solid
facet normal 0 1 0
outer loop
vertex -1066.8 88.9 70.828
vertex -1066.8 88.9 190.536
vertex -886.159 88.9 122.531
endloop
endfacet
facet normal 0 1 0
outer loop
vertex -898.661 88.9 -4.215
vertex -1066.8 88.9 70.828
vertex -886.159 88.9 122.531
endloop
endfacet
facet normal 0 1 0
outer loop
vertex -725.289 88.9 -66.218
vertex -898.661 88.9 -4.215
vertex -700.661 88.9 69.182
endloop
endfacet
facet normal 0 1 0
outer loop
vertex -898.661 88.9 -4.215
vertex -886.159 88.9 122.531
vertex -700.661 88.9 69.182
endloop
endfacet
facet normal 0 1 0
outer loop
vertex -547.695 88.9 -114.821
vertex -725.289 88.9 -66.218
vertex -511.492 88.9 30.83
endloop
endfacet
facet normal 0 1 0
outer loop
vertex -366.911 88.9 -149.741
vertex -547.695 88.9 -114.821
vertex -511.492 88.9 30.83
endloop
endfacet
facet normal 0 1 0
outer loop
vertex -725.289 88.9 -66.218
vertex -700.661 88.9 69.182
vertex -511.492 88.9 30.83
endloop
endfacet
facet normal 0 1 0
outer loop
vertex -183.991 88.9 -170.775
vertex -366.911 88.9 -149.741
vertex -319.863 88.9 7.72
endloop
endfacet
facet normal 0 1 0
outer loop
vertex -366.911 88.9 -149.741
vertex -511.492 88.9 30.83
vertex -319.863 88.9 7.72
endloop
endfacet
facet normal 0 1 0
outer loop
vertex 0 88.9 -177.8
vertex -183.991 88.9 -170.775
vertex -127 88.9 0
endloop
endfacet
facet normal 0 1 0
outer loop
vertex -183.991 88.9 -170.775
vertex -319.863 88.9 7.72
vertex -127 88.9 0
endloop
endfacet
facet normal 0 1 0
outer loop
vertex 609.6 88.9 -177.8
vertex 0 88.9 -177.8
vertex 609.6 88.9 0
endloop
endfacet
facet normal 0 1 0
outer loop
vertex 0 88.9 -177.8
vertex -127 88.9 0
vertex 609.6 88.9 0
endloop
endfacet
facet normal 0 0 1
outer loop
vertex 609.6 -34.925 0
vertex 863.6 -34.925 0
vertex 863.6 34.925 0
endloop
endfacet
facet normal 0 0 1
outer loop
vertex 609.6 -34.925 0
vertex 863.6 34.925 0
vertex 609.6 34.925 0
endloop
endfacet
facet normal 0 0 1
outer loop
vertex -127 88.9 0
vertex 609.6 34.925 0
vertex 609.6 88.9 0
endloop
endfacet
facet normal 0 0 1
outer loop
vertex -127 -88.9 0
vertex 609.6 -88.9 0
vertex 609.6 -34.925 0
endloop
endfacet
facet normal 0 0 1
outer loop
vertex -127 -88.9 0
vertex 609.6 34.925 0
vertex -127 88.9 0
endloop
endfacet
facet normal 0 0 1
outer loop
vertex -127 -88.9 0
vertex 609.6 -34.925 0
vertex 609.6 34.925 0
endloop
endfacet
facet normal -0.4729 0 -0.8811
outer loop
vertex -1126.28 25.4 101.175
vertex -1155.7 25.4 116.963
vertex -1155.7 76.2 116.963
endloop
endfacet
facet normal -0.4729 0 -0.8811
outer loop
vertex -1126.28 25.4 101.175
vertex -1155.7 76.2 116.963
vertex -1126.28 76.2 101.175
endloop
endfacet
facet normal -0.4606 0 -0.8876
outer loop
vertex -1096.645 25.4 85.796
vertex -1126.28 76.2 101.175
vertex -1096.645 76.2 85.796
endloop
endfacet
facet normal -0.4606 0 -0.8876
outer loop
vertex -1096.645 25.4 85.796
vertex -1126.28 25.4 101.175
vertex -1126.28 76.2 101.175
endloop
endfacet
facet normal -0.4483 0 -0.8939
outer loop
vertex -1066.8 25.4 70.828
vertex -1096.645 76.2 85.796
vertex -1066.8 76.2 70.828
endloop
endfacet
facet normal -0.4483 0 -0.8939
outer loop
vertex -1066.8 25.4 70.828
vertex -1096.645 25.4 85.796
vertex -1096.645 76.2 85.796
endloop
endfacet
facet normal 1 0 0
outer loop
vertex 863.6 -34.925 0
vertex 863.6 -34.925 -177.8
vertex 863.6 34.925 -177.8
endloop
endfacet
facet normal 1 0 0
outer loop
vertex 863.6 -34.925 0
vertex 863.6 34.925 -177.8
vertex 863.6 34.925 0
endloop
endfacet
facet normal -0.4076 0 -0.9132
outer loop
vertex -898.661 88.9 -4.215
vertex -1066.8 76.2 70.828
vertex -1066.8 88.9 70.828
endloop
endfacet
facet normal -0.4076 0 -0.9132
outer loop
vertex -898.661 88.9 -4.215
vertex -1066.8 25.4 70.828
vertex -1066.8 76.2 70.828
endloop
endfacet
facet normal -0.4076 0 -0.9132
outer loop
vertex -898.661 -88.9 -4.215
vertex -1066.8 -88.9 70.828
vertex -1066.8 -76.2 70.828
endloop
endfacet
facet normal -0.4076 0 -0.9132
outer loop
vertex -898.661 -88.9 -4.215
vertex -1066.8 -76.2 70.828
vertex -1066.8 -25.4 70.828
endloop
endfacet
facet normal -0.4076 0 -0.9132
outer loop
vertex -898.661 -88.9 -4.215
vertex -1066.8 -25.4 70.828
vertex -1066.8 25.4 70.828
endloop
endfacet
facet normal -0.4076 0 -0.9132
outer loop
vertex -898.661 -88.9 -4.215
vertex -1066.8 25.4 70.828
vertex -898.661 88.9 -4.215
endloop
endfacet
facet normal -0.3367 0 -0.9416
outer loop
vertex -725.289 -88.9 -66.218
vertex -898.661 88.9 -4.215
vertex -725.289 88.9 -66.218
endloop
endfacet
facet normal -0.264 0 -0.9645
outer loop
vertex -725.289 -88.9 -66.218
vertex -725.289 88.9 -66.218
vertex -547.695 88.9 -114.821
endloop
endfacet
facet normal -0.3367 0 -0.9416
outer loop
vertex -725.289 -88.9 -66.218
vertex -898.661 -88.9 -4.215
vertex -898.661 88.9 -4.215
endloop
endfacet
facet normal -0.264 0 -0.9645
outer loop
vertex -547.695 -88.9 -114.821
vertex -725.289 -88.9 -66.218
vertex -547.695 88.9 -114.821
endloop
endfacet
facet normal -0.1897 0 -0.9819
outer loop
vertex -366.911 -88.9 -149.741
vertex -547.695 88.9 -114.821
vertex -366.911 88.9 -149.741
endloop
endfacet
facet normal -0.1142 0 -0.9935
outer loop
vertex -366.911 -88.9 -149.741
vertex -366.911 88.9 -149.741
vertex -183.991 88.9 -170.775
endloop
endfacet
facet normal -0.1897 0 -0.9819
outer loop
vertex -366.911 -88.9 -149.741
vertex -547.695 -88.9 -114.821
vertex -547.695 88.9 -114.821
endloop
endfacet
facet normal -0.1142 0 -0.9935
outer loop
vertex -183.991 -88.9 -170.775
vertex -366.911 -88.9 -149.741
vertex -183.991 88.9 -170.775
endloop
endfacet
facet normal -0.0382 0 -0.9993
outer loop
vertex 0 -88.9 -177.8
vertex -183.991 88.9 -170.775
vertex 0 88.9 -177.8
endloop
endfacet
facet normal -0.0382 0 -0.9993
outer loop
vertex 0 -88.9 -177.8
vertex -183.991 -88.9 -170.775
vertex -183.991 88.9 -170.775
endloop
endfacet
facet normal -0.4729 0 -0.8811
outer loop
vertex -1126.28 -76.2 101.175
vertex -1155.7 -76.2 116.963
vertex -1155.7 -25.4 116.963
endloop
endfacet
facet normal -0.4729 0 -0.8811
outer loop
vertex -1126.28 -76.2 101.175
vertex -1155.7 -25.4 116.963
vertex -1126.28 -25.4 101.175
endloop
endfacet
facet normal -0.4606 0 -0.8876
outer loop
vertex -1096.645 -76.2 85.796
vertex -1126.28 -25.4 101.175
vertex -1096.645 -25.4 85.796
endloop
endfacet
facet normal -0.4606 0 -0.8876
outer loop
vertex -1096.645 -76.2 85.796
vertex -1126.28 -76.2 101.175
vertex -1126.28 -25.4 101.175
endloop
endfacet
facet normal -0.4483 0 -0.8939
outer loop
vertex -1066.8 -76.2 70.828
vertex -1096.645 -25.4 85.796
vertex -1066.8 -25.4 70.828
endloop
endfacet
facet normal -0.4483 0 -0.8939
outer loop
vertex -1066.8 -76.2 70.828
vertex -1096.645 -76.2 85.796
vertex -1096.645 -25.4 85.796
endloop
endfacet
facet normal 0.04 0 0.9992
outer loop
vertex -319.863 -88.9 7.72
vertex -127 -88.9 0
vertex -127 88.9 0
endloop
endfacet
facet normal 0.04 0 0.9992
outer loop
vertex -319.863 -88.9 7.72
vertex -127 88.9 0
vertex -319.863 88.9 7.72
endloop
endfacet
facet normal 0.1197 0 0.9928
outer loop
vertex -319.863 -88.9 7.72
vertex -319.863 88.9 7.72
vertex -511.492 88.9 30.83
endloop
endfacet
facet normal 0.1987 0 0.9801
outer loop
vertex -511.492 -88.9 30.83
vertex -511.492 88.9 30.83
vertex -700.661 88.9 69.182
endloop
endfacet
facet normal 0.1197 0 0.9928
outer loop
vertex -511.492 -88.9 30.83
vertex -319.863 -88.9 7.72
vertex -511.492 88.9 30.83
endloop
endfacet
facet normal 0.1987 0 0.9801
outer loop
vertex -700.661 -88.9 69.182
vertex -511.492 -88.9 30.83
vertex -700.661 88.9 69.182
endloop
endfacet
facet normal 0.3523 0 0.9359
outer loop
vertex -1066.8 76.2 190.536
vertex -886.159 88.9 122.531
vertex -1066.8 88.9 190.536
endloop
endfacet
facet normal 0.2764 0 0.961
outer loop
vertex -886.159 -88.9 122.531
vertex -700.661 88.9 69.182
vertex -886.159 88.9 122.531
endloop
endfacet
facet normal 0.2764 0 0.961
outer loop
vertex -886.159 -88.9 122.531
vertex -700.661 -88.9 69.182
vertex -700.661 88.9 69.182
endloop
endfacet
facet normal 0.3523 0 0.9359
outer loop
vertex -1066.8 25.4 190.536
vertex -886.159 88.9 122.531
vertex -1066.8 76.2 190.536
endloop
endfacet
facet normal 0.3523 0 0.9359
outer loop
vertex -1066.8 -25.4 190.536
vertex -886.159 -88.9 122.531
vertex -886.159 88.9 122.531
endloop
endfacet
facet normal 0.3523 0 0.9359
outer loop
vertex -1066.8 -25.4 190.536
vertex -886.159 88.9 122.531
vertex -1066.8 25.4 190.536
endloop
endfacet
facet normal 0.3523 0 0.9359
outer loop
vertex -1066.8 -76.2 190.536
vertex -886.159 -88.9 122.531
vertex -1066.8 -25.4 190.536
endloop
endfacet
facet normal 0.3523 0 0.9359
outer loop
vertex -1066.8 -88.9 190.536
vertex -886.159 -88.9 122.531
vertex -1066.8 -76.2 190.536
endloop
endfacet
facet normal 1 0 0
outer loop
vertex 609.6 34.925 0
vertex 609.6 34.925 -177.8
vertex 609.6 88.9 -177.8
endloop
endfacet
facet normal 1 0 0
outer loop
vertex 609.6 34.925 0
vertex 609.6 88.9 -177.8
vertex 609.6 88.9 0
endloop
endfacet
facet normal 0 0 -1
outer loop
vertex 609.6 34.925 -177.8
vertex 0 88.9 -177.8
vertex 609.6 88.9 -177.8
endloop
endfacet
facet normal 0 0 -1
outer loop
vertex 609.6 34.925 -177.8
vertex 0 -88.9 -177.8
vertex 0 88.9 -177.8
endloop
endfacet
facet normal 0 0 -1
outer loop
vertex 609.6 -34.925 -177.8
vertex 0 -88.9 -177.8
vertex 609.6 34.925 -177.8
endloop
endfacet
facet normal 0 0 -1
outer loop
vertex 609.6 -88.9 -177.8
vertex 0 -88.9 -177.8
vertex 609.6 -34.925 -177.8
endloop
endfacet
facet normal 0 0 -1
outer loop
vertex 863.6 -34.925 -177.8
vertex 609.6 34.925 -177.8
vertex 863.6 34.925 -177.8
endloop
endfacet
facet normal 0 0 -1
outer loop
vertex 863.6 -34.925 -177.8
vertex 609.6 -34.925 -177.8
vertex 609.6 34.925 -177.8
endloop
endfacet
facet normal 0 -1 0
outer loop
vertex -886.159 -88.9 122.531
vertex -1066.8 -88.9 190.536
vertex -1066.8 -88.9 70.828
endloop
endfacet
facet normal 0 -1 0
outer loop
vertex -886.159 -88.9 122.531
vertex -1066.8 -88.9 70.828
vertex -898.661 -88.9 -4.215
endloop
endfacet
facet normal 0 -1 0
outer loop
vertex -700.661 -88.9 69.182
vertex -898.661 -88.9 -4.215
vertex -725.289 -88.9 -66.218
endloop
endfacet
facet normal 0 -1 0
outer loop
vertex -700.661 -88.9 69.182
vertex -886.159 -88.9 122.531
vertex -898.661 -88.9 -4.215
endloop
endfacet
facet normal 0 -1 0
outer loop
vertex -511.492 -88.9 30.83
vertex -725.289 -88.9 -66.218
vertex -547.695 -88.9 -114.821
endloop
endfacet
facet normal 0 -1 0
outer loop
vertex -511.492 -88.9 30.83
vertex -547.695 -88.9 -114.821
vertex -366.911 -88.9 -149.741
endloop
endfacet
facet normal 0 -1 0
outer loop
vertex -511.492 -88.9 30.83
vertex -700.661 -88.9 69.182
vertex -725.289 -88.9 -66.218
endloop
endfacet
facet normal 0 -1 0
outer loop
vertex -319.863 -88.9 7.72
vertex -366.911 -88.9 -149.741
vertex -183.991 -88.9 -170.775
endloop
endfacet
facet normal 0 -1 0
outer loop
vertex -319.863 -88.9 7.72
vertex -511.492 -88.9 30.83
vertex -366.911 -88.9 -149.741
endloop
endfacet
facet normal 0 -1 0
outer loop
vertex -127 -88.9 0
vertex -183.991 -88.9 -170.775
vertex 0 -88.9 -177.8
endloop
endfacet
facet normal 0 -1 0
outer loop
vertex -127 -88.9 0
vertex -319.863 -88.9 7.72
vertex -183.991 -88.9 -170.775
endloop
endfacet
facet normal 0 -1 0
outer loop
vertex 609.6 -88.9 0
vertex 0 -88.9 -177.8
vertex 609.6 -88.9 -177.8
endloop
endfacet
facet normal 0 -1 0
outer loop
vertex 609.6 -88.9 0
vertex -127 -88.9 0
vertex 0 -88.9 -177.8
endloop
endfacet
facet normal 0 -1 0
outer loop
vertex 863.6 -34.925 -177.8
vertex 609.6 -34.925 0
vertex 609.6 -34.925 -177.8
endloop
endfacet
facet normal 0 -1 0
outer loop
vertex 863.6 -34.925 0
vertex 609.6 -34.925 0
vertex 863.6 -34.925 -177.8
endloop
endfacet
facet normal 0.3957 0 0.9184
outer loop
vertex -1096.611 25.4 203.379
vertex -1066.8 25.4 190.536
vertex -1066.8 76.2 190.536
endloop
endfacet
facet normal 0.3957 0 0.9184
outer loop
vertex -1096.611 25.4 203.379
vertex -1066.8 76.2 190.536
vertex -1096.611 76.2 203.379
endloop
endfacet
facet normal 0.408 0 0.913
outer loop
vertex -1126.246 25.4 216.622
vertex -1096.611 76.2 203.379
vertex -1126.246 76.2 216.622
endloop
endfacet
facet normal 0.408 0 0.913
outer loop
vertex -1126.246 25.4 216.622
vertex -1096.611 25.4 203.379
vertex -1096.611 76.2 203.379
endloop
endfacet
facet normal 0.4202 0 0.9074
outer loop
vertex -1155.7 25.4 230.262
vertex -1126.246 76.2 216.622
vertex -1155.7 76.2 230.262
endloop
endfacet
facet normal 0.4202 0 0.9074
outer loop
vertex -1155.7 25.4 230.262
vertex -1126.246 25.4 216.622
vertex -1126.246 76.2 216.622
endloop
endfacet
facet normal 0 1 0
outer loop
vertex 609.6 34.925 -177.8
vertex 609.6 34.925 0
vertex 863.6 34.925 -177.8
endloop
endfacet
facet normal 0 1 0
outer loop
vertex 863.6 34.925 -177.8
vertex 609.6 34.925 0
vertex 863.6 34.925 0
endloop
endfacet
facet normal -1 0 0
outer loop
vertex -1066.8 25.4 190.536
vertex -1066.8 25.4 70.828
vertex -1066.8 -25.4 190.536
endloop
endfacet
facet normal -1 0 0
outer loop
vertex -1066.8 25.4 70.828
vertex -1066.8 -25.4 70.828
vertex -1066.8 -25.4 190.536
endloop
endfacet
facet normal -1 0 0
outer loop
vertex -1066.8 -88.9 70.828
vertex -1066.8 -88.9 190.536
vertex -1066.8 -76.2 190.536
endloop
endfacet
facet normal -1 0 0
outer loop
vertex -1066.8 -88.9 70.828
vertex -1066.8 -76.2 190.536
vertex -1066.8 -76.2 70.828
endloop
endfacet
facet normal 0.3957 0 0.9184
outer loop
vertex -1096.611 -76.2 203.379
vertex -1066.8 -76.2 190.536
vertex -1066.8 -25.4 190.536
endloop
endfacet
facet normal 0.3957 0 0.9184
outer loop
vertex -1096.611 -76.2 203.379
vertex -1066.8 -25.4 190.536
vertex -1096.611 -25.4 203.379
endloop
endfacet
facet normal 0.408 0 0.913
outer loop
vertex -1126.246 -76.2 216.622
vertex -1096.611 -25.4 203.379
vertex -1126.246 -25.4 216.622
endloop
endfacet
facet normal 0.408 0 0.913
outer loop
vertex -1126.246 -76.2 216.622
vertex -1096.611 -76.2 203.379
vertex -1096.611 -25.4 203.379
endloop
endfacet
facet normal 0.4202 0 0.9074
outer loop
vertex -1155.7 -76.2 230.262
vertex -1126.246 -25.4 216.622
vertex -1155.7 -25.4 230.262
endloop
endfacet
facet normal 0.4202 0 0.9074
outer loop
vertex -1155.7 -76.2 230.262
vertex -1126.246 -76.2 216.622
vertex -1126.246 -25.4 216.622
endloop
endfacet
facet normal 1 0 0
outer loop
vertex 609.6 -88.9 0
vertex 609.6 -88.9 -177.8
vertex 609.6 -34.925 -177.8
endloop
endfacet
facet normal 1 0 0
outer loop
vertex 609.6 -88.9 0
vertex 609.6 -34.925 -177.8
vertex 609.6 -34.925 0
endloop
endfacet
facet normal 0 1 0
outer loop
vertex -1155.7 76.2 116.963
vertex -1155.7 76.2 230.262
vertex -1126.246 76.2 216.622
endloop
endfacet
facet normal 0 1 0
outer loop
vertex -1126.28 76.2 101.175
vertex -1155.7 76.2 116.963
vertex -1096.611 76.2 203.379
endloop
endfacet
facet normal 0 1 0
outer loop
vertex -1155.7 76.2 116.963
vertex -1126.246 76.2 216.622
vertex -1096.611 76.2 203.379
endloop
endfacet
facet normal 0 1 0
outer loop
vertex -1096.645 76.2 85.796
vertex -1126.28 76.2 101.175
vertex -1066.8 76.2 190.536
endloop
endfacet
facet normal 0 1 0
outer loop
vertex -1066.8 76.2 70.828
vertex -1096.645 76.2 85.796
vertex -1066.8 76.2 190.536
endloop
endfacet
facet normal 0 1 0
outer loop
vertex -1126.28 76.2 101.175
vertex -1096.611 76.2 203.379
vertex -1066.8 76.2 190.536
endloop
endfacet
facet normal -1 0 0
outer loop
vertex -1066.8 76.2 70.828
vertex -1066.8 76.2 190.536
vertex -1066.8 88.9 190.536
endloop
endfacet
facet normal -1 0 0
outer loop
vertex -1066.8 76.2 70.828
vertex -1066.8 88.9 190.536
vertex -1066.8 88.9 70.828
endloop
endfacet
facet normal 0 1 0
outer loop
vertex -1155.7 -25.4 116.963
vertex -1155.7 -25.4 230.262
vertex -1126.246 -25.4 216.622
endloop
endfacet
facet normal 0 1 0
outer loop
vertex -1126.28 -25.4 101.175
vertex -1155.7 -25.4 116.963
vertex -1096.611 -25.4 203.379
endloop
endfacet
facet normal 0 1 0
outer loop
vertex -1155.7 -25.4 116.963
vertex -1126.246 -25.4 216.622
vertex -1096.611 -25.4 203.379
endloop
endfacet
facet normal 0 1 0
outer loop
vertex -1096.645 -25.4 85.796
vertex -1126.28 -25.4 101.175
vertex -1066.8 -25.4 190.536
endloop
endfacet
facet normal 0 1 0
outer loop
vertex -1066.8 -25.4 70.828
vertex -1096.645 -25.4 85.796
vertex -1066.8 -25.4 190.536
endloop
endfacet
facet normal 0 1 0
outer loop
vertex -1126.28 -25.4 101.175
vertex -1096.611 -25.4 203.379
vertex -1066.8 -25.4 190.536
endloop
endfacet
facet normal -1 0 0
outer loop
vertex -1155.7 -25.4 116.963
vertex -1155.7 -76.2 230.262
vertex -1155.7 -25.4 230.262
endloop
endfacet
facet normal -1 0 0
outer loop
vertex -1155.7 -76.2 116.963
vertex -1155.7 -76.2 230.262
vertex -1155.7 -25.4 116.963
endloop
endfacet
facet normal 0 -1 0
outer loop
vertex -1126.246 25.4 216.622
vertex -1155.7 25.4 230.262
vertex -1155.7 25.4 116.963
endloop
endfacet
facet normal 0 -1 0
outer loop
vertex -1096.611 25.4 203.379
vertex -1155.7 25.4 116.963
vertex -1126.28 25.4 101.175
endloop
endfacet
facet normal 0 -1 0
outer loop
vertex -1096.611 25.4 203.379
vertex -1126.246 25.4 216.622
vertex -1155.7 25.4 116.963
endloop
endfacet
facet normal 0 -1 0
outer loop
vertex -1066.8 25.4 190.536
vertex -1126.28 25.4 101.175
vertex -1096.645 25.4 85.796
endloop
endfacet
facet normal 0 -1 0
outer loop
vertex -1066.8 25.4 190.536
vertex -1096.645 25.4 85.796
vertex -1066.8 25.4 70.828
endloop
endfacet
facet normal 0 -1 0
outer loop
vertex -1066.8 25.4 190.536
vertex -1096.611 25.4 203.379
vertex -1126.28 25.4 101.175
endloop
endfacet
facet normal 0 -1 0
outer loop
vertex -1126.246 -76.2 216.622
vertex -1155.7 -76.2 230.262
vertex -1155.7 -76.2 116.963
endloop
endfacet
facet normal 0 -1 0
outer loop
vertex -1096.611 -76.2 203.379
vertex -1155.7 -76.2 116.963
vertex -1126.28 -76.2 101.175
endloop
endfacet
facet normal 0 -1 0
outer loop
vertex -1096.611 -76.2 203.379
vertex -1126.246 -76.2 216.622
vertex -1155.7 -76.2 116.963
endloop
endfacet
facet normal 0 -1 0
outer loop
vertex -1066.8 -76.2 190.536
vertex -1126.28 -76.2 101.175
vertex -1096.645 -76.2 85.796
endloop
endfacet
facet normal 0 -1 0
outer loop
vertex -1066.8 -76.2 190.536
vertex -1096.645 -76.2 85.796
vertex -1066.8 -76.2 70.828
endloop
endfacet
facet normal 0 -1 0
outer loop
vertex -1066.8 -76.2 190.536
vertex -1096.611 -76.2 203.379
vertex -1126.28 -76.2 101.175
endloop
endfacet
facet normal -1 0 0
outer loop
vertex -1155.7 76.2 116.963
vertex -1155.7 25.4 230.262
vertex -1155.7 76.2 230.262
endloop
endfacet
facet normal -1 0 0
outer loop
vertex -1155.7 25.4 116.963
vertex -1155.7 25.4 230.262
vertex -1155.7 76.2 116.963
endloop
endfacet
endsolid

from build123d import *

# Parameters (mm, degrees)
F0_W     = 254
F0_H     = 177.8
F1_DEPTH = 34.925
F2_DEPTH = 88.9
F3_DEPTH = 76.2
F4_DEPTH = 25.4


with BuildPart() as f1:
    # F0 (on Front) → F1 (new body, symmetric)
    with BuildSketch(Plane.XZ):
        with Locations((736.6, -88.9)):
            Rectangle(F0_W, F0_H)
    extrude(amount=F1_DEPTH, both=True)

    # F0 (on Front) → F2 (join, symmetric)
    with BuildSketch(Plane.XZ):
        with BuildLine():
            Line((609.6, 0), (-127, 0))
            ThreePointArc((-127, 0), (-606.4601433609, 48.1137509537), (-1066.8, 190.5362860105))
            Line((-1066.8, 190.5362860105), (-1066.8, 70.8278600943))
            ThreePointArc((-1066.8, 70.8278600943), (-547.6947262881, -114.8211673081), (0, -177.8))
            Line((0, -177.8), (609.6, -177.8))
            Line((609.6, -177.8), (609.6, 0))
        make_face()
    extrude(amount=F2_DEPTH, both=True)

    # F0 (on Front) → F3 (join, symmetric)
    with BuildSketch(Plane.XZ):
        with BuildLine():
            Line((-1066.8, 70.8278600943), (-1066.8, 190.5362860105))
            ThreePointArc((-1066.8, 190.5362860105), (-1111.4504024994, 209.9506576069), (-1155.7, 230.2619694521))
            Line((-1155.7, 230.2619694521), (-1155.7, 116.963348915))
            ThreePointArc((-1155.7, 116.963348915), (-1111.4893986594, 93.4342993063), (-1066.8, 70.8278600943))
        make_face()
    extrude(amount=F3_DEPTH, both=True)

    # F0 (on Front) → F4 (cut, symmetric)
    with BuildSketch(Plane.XZ):
        with BuildLine():
            Line((-1066.8, 70.8278600943), (-1066.8, 190.5362860105))
            ThreePointArc((-1066.8, 190.5362860105), (-1111.4504024994, 209.9506576069), (-1155.7, 230.2619694521))
            Line((-1155.7, 230.2619694521), (-1155.7, 116.963348915))
            ThreePointArc((-1155.7, 116.963348915), (-1111.4893986594, 93.4342993063), (-1066.8, 70.8278600943))
        make_face()
    extrude(amount=F4_DEPTH, both=True, mode=Mode.SUBTRACT)


solid = f1.part
